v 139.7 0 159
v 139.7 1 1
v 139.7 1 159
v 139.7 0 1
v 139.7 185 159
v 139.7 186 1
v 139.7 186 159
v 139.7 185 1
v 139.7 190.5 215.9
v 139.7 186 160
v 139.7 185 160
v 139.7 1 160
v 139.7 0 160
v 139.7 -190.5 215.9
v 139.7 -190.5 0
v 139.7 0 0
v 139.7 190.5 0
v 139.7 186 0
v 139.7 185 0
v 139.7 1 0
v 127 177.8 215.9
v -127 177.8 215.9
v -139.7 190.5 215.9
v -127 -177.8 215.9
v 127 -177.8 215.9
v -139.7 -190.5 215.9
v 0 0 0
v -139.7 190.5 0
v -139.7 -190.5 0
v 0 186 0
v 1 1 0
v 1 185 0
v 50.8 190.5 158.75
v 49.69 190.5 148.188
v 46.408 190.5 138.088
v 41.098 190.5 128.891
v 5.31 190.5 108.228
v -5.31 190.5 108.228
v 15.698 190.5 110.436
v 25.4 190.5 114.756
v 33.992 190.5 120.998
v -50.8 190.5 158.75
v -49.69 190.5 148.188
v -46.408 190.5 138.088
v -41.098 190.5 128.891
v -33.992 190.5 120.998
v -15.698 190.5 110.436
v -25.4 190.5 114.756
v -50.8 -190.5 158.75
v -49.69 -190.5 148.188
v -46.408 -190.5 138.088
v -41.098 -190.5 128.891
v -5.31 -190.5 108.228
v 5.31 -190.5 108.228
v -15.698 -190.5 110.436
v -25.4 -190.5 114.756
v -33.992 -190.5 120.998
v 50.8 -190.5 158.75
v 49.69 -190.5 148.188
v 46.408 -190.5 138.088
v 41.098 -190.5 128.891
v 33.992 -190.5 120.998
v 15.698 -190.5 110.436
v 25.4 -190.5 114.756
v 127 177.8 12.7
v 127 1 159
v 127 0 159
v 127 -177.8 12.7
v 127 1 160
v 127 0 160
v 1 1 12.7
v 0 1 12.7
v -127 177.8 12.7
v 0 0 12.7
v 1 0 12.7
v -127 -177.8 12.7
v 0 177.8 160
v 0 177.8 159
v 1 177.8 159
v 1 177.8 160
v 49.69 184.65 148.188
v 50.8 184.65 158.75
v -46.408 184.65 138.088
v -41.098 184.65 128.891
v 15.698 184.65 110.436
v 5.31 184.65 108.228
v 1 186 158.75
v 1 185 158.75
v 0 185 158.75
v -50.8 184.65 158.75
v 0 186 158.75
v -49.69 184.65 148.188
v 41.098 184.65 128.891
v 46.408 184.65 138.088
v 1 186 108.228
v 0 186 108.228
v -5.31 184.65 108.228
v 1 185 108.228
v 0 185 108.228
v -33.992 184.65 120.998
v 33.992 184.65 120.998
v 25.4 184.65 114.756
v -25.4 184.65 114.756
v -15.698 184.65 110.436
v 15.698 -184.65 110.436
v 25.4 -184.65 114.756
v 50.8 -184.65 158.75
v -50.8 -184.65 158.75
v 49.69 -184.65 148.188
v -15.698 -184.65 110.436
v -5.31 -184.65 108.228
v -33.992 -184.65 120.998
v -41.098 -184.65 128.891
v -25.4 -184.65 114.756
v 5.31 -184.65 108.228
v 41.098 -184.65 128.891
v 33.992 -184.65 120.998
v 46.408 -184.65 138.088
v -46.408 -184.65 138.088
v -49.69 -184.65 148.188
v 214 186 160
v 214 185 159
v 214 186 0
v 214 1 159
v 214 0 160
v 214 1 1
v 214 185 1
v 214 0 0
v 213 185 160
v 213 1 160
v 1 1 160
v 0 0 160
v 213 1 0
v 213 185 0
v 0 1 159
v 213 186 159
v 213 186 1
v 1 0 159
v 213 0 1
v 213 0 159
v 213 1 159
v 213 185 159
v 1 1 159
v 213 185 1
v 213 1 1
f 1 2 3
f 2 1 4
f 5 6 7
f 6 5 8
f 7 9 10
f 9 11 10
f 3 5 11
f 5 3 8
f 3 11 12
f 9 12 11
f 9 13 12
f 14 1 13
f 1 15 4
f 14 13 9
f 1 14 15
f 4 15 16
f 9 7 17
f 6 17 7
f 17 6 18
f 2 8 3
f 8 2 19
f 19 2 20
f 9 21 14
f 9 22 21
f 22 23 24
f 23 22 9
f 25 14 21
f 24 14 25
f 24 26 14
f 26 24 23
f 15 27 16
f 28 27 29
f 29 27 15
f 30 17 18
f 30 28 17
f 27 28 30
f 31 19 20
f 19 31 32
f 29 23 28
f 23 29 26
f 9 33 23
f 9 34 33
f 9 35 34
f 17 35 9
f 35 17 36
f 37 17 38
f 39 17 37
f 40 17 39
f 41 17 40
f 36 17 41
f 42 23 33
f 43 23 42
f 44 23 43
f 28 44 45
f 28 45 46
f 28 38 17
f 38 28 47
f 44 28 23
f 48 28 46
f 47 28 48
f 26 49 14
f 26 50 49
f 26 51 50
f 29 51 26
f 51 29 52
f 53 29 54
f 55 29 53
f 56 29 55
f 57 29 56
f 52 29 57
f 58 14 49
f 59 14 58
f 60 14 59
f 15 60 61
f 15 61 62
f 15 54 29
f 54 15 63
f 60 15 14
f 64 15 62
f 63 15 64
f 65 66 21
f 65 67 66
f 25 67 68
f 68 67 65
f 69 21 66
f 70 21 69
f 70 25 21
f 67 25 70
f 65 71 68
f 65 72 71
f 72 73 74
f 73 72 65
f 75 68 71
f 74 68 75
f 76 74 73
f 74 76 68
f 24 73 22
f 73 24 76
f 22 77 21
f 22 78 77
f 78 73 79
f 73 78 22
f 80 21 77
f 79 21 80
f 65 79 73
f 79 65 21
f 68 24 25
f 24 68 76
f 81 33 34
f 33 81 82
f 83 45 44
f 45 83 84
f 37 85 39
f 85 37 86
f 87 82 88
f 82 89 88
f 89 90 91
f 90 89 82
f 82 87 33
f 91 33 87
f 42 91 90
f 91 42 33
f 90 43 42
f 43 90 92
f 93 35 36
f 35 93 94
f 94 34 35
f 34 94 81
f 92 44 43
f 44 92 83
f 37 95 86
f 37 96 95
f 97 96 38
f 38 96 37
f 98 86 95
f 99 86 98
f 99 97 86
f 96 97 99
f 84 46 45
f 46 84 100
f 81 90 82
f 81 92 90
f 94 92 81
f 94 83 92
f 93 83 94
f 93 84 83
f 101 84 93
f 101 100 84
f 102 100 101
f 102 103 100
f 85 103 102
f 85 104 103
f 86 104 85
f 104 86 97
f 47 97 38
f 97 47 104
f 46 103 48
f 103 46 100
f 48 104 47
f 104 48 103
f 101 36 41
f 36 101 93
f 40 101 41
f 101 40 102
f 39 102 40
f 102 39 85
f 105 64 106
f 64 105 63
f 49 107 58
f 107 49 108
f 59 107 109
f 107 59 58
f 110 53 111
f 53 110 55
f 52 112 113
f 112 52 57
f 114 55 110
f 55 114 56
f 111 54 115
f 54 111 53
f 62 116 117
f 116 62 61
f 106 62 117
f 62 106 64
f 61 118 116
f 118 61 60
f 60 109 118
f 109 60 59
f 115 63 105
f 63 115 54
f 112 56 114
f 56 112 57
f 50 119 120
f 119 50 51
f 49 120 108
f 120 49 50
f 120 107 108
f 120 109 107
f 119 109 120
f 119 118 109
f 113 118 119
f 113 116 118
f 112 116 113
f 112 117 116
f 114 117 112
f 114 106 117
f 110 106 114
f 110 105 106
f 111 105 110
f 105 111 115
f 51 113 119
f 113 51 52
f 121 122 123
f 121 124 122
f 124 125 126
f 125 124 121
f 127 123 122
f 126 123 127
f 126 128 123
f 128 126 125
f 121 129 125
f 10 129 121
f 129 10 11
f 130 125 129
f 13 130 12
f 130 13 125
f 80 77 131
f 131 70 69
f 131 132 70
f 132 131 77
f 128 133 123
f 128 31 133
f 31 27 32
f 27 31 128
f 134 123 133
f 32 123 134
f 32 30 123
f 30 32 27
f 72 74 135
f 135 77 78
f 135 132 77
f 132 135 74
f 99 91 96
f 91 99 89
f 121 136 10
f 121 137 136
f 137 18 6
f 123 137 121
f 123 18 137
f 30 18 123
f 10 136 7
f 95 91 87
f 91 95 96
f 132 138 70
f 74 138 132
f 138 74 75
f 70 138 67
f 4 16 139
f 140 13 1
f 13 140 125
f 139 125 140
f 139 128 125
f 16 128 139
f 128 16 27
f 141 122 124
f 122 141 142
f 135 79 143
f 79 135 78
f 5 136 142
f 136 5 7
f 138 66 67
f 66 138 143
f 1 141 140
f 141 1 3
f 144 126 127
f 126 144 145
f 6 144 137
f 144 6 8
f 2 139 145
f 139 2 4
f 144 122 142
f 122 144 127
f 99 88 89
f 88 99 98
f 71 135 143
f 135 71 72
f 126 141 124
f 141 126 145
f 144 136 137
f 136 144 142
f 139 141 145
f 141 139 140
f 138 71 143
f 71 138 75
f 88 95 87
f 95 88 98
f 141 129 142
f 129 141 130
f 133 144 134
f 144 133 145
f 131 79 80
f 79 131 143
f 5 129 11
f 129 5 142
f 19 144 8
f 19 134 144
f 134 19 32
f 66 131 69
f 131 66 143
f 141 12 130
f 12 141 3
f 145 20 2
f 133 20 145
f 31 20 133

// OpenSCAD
//consts
mmPIn = 25.4;
difShft=1;

TashPrintBeadX = 214;
TashPrintBeadY = 186;
TashPrintBeadZ = 160;

outerX = mmPIn*11;
outerY = mmPIn*15;
outerZ = mmPIn*8.5;
wallWidth = mmPIn*.5;

handY = mmPIn*.25;
handZ = mmPIn*2;
handX = 2*handZ;

module cubeOutline(dim, center=false, barWidth=1){
    difference(){
        cube(dim,center);
        if(!center)
            translate(barWidth*[-1,1,1])
        cube(dim+barWidth*[2,-2,-2], center);
        if(!center)
            translate(barWidth*[1,-1,1])
        cube(dim+barWidth*[-2,2,-2], center);
        if(!center)
            translate(barWidth*[1,1,-1])
        cube(dim+barWidth*[-2,-2,2], center);
    }
}

module handle2(){
    //removed -handY/2 now lines up with edge
    translate([0, outerY/2+difShft/2, handZ])
    rotate([90,0,0])
    linear_extrude(height=handY)
    difference(){  
        circle(handZ);
        translate([0, handZ/2,0])
        square([2*handZ,handZ],center=true);
    }
}

module handle(){

    translate([0, outerY/2-handY/2+difShft/2, 0])
    cube([handX,handY+difShft,handZ],center=true);
}

module inside(){
    translate([0, 0, difShft/2+wallWidth/2])
    cube([outerX-2*wallWidth, outerY-2*wallWidth, outerZ+difShft-wallWidth],center=true);
}
module main(){
    translate([0,0,outerZ/2])
    difference() {
        cube([outerX,outerY,outerZ],center=true);
        inside();
        handle2();
        mirror([0,1,0])
        handle2();
    }
}

main();
cubeOutline([TashPrintBeadX,TashPrintBeadY,TashPrintBeadZ]);
